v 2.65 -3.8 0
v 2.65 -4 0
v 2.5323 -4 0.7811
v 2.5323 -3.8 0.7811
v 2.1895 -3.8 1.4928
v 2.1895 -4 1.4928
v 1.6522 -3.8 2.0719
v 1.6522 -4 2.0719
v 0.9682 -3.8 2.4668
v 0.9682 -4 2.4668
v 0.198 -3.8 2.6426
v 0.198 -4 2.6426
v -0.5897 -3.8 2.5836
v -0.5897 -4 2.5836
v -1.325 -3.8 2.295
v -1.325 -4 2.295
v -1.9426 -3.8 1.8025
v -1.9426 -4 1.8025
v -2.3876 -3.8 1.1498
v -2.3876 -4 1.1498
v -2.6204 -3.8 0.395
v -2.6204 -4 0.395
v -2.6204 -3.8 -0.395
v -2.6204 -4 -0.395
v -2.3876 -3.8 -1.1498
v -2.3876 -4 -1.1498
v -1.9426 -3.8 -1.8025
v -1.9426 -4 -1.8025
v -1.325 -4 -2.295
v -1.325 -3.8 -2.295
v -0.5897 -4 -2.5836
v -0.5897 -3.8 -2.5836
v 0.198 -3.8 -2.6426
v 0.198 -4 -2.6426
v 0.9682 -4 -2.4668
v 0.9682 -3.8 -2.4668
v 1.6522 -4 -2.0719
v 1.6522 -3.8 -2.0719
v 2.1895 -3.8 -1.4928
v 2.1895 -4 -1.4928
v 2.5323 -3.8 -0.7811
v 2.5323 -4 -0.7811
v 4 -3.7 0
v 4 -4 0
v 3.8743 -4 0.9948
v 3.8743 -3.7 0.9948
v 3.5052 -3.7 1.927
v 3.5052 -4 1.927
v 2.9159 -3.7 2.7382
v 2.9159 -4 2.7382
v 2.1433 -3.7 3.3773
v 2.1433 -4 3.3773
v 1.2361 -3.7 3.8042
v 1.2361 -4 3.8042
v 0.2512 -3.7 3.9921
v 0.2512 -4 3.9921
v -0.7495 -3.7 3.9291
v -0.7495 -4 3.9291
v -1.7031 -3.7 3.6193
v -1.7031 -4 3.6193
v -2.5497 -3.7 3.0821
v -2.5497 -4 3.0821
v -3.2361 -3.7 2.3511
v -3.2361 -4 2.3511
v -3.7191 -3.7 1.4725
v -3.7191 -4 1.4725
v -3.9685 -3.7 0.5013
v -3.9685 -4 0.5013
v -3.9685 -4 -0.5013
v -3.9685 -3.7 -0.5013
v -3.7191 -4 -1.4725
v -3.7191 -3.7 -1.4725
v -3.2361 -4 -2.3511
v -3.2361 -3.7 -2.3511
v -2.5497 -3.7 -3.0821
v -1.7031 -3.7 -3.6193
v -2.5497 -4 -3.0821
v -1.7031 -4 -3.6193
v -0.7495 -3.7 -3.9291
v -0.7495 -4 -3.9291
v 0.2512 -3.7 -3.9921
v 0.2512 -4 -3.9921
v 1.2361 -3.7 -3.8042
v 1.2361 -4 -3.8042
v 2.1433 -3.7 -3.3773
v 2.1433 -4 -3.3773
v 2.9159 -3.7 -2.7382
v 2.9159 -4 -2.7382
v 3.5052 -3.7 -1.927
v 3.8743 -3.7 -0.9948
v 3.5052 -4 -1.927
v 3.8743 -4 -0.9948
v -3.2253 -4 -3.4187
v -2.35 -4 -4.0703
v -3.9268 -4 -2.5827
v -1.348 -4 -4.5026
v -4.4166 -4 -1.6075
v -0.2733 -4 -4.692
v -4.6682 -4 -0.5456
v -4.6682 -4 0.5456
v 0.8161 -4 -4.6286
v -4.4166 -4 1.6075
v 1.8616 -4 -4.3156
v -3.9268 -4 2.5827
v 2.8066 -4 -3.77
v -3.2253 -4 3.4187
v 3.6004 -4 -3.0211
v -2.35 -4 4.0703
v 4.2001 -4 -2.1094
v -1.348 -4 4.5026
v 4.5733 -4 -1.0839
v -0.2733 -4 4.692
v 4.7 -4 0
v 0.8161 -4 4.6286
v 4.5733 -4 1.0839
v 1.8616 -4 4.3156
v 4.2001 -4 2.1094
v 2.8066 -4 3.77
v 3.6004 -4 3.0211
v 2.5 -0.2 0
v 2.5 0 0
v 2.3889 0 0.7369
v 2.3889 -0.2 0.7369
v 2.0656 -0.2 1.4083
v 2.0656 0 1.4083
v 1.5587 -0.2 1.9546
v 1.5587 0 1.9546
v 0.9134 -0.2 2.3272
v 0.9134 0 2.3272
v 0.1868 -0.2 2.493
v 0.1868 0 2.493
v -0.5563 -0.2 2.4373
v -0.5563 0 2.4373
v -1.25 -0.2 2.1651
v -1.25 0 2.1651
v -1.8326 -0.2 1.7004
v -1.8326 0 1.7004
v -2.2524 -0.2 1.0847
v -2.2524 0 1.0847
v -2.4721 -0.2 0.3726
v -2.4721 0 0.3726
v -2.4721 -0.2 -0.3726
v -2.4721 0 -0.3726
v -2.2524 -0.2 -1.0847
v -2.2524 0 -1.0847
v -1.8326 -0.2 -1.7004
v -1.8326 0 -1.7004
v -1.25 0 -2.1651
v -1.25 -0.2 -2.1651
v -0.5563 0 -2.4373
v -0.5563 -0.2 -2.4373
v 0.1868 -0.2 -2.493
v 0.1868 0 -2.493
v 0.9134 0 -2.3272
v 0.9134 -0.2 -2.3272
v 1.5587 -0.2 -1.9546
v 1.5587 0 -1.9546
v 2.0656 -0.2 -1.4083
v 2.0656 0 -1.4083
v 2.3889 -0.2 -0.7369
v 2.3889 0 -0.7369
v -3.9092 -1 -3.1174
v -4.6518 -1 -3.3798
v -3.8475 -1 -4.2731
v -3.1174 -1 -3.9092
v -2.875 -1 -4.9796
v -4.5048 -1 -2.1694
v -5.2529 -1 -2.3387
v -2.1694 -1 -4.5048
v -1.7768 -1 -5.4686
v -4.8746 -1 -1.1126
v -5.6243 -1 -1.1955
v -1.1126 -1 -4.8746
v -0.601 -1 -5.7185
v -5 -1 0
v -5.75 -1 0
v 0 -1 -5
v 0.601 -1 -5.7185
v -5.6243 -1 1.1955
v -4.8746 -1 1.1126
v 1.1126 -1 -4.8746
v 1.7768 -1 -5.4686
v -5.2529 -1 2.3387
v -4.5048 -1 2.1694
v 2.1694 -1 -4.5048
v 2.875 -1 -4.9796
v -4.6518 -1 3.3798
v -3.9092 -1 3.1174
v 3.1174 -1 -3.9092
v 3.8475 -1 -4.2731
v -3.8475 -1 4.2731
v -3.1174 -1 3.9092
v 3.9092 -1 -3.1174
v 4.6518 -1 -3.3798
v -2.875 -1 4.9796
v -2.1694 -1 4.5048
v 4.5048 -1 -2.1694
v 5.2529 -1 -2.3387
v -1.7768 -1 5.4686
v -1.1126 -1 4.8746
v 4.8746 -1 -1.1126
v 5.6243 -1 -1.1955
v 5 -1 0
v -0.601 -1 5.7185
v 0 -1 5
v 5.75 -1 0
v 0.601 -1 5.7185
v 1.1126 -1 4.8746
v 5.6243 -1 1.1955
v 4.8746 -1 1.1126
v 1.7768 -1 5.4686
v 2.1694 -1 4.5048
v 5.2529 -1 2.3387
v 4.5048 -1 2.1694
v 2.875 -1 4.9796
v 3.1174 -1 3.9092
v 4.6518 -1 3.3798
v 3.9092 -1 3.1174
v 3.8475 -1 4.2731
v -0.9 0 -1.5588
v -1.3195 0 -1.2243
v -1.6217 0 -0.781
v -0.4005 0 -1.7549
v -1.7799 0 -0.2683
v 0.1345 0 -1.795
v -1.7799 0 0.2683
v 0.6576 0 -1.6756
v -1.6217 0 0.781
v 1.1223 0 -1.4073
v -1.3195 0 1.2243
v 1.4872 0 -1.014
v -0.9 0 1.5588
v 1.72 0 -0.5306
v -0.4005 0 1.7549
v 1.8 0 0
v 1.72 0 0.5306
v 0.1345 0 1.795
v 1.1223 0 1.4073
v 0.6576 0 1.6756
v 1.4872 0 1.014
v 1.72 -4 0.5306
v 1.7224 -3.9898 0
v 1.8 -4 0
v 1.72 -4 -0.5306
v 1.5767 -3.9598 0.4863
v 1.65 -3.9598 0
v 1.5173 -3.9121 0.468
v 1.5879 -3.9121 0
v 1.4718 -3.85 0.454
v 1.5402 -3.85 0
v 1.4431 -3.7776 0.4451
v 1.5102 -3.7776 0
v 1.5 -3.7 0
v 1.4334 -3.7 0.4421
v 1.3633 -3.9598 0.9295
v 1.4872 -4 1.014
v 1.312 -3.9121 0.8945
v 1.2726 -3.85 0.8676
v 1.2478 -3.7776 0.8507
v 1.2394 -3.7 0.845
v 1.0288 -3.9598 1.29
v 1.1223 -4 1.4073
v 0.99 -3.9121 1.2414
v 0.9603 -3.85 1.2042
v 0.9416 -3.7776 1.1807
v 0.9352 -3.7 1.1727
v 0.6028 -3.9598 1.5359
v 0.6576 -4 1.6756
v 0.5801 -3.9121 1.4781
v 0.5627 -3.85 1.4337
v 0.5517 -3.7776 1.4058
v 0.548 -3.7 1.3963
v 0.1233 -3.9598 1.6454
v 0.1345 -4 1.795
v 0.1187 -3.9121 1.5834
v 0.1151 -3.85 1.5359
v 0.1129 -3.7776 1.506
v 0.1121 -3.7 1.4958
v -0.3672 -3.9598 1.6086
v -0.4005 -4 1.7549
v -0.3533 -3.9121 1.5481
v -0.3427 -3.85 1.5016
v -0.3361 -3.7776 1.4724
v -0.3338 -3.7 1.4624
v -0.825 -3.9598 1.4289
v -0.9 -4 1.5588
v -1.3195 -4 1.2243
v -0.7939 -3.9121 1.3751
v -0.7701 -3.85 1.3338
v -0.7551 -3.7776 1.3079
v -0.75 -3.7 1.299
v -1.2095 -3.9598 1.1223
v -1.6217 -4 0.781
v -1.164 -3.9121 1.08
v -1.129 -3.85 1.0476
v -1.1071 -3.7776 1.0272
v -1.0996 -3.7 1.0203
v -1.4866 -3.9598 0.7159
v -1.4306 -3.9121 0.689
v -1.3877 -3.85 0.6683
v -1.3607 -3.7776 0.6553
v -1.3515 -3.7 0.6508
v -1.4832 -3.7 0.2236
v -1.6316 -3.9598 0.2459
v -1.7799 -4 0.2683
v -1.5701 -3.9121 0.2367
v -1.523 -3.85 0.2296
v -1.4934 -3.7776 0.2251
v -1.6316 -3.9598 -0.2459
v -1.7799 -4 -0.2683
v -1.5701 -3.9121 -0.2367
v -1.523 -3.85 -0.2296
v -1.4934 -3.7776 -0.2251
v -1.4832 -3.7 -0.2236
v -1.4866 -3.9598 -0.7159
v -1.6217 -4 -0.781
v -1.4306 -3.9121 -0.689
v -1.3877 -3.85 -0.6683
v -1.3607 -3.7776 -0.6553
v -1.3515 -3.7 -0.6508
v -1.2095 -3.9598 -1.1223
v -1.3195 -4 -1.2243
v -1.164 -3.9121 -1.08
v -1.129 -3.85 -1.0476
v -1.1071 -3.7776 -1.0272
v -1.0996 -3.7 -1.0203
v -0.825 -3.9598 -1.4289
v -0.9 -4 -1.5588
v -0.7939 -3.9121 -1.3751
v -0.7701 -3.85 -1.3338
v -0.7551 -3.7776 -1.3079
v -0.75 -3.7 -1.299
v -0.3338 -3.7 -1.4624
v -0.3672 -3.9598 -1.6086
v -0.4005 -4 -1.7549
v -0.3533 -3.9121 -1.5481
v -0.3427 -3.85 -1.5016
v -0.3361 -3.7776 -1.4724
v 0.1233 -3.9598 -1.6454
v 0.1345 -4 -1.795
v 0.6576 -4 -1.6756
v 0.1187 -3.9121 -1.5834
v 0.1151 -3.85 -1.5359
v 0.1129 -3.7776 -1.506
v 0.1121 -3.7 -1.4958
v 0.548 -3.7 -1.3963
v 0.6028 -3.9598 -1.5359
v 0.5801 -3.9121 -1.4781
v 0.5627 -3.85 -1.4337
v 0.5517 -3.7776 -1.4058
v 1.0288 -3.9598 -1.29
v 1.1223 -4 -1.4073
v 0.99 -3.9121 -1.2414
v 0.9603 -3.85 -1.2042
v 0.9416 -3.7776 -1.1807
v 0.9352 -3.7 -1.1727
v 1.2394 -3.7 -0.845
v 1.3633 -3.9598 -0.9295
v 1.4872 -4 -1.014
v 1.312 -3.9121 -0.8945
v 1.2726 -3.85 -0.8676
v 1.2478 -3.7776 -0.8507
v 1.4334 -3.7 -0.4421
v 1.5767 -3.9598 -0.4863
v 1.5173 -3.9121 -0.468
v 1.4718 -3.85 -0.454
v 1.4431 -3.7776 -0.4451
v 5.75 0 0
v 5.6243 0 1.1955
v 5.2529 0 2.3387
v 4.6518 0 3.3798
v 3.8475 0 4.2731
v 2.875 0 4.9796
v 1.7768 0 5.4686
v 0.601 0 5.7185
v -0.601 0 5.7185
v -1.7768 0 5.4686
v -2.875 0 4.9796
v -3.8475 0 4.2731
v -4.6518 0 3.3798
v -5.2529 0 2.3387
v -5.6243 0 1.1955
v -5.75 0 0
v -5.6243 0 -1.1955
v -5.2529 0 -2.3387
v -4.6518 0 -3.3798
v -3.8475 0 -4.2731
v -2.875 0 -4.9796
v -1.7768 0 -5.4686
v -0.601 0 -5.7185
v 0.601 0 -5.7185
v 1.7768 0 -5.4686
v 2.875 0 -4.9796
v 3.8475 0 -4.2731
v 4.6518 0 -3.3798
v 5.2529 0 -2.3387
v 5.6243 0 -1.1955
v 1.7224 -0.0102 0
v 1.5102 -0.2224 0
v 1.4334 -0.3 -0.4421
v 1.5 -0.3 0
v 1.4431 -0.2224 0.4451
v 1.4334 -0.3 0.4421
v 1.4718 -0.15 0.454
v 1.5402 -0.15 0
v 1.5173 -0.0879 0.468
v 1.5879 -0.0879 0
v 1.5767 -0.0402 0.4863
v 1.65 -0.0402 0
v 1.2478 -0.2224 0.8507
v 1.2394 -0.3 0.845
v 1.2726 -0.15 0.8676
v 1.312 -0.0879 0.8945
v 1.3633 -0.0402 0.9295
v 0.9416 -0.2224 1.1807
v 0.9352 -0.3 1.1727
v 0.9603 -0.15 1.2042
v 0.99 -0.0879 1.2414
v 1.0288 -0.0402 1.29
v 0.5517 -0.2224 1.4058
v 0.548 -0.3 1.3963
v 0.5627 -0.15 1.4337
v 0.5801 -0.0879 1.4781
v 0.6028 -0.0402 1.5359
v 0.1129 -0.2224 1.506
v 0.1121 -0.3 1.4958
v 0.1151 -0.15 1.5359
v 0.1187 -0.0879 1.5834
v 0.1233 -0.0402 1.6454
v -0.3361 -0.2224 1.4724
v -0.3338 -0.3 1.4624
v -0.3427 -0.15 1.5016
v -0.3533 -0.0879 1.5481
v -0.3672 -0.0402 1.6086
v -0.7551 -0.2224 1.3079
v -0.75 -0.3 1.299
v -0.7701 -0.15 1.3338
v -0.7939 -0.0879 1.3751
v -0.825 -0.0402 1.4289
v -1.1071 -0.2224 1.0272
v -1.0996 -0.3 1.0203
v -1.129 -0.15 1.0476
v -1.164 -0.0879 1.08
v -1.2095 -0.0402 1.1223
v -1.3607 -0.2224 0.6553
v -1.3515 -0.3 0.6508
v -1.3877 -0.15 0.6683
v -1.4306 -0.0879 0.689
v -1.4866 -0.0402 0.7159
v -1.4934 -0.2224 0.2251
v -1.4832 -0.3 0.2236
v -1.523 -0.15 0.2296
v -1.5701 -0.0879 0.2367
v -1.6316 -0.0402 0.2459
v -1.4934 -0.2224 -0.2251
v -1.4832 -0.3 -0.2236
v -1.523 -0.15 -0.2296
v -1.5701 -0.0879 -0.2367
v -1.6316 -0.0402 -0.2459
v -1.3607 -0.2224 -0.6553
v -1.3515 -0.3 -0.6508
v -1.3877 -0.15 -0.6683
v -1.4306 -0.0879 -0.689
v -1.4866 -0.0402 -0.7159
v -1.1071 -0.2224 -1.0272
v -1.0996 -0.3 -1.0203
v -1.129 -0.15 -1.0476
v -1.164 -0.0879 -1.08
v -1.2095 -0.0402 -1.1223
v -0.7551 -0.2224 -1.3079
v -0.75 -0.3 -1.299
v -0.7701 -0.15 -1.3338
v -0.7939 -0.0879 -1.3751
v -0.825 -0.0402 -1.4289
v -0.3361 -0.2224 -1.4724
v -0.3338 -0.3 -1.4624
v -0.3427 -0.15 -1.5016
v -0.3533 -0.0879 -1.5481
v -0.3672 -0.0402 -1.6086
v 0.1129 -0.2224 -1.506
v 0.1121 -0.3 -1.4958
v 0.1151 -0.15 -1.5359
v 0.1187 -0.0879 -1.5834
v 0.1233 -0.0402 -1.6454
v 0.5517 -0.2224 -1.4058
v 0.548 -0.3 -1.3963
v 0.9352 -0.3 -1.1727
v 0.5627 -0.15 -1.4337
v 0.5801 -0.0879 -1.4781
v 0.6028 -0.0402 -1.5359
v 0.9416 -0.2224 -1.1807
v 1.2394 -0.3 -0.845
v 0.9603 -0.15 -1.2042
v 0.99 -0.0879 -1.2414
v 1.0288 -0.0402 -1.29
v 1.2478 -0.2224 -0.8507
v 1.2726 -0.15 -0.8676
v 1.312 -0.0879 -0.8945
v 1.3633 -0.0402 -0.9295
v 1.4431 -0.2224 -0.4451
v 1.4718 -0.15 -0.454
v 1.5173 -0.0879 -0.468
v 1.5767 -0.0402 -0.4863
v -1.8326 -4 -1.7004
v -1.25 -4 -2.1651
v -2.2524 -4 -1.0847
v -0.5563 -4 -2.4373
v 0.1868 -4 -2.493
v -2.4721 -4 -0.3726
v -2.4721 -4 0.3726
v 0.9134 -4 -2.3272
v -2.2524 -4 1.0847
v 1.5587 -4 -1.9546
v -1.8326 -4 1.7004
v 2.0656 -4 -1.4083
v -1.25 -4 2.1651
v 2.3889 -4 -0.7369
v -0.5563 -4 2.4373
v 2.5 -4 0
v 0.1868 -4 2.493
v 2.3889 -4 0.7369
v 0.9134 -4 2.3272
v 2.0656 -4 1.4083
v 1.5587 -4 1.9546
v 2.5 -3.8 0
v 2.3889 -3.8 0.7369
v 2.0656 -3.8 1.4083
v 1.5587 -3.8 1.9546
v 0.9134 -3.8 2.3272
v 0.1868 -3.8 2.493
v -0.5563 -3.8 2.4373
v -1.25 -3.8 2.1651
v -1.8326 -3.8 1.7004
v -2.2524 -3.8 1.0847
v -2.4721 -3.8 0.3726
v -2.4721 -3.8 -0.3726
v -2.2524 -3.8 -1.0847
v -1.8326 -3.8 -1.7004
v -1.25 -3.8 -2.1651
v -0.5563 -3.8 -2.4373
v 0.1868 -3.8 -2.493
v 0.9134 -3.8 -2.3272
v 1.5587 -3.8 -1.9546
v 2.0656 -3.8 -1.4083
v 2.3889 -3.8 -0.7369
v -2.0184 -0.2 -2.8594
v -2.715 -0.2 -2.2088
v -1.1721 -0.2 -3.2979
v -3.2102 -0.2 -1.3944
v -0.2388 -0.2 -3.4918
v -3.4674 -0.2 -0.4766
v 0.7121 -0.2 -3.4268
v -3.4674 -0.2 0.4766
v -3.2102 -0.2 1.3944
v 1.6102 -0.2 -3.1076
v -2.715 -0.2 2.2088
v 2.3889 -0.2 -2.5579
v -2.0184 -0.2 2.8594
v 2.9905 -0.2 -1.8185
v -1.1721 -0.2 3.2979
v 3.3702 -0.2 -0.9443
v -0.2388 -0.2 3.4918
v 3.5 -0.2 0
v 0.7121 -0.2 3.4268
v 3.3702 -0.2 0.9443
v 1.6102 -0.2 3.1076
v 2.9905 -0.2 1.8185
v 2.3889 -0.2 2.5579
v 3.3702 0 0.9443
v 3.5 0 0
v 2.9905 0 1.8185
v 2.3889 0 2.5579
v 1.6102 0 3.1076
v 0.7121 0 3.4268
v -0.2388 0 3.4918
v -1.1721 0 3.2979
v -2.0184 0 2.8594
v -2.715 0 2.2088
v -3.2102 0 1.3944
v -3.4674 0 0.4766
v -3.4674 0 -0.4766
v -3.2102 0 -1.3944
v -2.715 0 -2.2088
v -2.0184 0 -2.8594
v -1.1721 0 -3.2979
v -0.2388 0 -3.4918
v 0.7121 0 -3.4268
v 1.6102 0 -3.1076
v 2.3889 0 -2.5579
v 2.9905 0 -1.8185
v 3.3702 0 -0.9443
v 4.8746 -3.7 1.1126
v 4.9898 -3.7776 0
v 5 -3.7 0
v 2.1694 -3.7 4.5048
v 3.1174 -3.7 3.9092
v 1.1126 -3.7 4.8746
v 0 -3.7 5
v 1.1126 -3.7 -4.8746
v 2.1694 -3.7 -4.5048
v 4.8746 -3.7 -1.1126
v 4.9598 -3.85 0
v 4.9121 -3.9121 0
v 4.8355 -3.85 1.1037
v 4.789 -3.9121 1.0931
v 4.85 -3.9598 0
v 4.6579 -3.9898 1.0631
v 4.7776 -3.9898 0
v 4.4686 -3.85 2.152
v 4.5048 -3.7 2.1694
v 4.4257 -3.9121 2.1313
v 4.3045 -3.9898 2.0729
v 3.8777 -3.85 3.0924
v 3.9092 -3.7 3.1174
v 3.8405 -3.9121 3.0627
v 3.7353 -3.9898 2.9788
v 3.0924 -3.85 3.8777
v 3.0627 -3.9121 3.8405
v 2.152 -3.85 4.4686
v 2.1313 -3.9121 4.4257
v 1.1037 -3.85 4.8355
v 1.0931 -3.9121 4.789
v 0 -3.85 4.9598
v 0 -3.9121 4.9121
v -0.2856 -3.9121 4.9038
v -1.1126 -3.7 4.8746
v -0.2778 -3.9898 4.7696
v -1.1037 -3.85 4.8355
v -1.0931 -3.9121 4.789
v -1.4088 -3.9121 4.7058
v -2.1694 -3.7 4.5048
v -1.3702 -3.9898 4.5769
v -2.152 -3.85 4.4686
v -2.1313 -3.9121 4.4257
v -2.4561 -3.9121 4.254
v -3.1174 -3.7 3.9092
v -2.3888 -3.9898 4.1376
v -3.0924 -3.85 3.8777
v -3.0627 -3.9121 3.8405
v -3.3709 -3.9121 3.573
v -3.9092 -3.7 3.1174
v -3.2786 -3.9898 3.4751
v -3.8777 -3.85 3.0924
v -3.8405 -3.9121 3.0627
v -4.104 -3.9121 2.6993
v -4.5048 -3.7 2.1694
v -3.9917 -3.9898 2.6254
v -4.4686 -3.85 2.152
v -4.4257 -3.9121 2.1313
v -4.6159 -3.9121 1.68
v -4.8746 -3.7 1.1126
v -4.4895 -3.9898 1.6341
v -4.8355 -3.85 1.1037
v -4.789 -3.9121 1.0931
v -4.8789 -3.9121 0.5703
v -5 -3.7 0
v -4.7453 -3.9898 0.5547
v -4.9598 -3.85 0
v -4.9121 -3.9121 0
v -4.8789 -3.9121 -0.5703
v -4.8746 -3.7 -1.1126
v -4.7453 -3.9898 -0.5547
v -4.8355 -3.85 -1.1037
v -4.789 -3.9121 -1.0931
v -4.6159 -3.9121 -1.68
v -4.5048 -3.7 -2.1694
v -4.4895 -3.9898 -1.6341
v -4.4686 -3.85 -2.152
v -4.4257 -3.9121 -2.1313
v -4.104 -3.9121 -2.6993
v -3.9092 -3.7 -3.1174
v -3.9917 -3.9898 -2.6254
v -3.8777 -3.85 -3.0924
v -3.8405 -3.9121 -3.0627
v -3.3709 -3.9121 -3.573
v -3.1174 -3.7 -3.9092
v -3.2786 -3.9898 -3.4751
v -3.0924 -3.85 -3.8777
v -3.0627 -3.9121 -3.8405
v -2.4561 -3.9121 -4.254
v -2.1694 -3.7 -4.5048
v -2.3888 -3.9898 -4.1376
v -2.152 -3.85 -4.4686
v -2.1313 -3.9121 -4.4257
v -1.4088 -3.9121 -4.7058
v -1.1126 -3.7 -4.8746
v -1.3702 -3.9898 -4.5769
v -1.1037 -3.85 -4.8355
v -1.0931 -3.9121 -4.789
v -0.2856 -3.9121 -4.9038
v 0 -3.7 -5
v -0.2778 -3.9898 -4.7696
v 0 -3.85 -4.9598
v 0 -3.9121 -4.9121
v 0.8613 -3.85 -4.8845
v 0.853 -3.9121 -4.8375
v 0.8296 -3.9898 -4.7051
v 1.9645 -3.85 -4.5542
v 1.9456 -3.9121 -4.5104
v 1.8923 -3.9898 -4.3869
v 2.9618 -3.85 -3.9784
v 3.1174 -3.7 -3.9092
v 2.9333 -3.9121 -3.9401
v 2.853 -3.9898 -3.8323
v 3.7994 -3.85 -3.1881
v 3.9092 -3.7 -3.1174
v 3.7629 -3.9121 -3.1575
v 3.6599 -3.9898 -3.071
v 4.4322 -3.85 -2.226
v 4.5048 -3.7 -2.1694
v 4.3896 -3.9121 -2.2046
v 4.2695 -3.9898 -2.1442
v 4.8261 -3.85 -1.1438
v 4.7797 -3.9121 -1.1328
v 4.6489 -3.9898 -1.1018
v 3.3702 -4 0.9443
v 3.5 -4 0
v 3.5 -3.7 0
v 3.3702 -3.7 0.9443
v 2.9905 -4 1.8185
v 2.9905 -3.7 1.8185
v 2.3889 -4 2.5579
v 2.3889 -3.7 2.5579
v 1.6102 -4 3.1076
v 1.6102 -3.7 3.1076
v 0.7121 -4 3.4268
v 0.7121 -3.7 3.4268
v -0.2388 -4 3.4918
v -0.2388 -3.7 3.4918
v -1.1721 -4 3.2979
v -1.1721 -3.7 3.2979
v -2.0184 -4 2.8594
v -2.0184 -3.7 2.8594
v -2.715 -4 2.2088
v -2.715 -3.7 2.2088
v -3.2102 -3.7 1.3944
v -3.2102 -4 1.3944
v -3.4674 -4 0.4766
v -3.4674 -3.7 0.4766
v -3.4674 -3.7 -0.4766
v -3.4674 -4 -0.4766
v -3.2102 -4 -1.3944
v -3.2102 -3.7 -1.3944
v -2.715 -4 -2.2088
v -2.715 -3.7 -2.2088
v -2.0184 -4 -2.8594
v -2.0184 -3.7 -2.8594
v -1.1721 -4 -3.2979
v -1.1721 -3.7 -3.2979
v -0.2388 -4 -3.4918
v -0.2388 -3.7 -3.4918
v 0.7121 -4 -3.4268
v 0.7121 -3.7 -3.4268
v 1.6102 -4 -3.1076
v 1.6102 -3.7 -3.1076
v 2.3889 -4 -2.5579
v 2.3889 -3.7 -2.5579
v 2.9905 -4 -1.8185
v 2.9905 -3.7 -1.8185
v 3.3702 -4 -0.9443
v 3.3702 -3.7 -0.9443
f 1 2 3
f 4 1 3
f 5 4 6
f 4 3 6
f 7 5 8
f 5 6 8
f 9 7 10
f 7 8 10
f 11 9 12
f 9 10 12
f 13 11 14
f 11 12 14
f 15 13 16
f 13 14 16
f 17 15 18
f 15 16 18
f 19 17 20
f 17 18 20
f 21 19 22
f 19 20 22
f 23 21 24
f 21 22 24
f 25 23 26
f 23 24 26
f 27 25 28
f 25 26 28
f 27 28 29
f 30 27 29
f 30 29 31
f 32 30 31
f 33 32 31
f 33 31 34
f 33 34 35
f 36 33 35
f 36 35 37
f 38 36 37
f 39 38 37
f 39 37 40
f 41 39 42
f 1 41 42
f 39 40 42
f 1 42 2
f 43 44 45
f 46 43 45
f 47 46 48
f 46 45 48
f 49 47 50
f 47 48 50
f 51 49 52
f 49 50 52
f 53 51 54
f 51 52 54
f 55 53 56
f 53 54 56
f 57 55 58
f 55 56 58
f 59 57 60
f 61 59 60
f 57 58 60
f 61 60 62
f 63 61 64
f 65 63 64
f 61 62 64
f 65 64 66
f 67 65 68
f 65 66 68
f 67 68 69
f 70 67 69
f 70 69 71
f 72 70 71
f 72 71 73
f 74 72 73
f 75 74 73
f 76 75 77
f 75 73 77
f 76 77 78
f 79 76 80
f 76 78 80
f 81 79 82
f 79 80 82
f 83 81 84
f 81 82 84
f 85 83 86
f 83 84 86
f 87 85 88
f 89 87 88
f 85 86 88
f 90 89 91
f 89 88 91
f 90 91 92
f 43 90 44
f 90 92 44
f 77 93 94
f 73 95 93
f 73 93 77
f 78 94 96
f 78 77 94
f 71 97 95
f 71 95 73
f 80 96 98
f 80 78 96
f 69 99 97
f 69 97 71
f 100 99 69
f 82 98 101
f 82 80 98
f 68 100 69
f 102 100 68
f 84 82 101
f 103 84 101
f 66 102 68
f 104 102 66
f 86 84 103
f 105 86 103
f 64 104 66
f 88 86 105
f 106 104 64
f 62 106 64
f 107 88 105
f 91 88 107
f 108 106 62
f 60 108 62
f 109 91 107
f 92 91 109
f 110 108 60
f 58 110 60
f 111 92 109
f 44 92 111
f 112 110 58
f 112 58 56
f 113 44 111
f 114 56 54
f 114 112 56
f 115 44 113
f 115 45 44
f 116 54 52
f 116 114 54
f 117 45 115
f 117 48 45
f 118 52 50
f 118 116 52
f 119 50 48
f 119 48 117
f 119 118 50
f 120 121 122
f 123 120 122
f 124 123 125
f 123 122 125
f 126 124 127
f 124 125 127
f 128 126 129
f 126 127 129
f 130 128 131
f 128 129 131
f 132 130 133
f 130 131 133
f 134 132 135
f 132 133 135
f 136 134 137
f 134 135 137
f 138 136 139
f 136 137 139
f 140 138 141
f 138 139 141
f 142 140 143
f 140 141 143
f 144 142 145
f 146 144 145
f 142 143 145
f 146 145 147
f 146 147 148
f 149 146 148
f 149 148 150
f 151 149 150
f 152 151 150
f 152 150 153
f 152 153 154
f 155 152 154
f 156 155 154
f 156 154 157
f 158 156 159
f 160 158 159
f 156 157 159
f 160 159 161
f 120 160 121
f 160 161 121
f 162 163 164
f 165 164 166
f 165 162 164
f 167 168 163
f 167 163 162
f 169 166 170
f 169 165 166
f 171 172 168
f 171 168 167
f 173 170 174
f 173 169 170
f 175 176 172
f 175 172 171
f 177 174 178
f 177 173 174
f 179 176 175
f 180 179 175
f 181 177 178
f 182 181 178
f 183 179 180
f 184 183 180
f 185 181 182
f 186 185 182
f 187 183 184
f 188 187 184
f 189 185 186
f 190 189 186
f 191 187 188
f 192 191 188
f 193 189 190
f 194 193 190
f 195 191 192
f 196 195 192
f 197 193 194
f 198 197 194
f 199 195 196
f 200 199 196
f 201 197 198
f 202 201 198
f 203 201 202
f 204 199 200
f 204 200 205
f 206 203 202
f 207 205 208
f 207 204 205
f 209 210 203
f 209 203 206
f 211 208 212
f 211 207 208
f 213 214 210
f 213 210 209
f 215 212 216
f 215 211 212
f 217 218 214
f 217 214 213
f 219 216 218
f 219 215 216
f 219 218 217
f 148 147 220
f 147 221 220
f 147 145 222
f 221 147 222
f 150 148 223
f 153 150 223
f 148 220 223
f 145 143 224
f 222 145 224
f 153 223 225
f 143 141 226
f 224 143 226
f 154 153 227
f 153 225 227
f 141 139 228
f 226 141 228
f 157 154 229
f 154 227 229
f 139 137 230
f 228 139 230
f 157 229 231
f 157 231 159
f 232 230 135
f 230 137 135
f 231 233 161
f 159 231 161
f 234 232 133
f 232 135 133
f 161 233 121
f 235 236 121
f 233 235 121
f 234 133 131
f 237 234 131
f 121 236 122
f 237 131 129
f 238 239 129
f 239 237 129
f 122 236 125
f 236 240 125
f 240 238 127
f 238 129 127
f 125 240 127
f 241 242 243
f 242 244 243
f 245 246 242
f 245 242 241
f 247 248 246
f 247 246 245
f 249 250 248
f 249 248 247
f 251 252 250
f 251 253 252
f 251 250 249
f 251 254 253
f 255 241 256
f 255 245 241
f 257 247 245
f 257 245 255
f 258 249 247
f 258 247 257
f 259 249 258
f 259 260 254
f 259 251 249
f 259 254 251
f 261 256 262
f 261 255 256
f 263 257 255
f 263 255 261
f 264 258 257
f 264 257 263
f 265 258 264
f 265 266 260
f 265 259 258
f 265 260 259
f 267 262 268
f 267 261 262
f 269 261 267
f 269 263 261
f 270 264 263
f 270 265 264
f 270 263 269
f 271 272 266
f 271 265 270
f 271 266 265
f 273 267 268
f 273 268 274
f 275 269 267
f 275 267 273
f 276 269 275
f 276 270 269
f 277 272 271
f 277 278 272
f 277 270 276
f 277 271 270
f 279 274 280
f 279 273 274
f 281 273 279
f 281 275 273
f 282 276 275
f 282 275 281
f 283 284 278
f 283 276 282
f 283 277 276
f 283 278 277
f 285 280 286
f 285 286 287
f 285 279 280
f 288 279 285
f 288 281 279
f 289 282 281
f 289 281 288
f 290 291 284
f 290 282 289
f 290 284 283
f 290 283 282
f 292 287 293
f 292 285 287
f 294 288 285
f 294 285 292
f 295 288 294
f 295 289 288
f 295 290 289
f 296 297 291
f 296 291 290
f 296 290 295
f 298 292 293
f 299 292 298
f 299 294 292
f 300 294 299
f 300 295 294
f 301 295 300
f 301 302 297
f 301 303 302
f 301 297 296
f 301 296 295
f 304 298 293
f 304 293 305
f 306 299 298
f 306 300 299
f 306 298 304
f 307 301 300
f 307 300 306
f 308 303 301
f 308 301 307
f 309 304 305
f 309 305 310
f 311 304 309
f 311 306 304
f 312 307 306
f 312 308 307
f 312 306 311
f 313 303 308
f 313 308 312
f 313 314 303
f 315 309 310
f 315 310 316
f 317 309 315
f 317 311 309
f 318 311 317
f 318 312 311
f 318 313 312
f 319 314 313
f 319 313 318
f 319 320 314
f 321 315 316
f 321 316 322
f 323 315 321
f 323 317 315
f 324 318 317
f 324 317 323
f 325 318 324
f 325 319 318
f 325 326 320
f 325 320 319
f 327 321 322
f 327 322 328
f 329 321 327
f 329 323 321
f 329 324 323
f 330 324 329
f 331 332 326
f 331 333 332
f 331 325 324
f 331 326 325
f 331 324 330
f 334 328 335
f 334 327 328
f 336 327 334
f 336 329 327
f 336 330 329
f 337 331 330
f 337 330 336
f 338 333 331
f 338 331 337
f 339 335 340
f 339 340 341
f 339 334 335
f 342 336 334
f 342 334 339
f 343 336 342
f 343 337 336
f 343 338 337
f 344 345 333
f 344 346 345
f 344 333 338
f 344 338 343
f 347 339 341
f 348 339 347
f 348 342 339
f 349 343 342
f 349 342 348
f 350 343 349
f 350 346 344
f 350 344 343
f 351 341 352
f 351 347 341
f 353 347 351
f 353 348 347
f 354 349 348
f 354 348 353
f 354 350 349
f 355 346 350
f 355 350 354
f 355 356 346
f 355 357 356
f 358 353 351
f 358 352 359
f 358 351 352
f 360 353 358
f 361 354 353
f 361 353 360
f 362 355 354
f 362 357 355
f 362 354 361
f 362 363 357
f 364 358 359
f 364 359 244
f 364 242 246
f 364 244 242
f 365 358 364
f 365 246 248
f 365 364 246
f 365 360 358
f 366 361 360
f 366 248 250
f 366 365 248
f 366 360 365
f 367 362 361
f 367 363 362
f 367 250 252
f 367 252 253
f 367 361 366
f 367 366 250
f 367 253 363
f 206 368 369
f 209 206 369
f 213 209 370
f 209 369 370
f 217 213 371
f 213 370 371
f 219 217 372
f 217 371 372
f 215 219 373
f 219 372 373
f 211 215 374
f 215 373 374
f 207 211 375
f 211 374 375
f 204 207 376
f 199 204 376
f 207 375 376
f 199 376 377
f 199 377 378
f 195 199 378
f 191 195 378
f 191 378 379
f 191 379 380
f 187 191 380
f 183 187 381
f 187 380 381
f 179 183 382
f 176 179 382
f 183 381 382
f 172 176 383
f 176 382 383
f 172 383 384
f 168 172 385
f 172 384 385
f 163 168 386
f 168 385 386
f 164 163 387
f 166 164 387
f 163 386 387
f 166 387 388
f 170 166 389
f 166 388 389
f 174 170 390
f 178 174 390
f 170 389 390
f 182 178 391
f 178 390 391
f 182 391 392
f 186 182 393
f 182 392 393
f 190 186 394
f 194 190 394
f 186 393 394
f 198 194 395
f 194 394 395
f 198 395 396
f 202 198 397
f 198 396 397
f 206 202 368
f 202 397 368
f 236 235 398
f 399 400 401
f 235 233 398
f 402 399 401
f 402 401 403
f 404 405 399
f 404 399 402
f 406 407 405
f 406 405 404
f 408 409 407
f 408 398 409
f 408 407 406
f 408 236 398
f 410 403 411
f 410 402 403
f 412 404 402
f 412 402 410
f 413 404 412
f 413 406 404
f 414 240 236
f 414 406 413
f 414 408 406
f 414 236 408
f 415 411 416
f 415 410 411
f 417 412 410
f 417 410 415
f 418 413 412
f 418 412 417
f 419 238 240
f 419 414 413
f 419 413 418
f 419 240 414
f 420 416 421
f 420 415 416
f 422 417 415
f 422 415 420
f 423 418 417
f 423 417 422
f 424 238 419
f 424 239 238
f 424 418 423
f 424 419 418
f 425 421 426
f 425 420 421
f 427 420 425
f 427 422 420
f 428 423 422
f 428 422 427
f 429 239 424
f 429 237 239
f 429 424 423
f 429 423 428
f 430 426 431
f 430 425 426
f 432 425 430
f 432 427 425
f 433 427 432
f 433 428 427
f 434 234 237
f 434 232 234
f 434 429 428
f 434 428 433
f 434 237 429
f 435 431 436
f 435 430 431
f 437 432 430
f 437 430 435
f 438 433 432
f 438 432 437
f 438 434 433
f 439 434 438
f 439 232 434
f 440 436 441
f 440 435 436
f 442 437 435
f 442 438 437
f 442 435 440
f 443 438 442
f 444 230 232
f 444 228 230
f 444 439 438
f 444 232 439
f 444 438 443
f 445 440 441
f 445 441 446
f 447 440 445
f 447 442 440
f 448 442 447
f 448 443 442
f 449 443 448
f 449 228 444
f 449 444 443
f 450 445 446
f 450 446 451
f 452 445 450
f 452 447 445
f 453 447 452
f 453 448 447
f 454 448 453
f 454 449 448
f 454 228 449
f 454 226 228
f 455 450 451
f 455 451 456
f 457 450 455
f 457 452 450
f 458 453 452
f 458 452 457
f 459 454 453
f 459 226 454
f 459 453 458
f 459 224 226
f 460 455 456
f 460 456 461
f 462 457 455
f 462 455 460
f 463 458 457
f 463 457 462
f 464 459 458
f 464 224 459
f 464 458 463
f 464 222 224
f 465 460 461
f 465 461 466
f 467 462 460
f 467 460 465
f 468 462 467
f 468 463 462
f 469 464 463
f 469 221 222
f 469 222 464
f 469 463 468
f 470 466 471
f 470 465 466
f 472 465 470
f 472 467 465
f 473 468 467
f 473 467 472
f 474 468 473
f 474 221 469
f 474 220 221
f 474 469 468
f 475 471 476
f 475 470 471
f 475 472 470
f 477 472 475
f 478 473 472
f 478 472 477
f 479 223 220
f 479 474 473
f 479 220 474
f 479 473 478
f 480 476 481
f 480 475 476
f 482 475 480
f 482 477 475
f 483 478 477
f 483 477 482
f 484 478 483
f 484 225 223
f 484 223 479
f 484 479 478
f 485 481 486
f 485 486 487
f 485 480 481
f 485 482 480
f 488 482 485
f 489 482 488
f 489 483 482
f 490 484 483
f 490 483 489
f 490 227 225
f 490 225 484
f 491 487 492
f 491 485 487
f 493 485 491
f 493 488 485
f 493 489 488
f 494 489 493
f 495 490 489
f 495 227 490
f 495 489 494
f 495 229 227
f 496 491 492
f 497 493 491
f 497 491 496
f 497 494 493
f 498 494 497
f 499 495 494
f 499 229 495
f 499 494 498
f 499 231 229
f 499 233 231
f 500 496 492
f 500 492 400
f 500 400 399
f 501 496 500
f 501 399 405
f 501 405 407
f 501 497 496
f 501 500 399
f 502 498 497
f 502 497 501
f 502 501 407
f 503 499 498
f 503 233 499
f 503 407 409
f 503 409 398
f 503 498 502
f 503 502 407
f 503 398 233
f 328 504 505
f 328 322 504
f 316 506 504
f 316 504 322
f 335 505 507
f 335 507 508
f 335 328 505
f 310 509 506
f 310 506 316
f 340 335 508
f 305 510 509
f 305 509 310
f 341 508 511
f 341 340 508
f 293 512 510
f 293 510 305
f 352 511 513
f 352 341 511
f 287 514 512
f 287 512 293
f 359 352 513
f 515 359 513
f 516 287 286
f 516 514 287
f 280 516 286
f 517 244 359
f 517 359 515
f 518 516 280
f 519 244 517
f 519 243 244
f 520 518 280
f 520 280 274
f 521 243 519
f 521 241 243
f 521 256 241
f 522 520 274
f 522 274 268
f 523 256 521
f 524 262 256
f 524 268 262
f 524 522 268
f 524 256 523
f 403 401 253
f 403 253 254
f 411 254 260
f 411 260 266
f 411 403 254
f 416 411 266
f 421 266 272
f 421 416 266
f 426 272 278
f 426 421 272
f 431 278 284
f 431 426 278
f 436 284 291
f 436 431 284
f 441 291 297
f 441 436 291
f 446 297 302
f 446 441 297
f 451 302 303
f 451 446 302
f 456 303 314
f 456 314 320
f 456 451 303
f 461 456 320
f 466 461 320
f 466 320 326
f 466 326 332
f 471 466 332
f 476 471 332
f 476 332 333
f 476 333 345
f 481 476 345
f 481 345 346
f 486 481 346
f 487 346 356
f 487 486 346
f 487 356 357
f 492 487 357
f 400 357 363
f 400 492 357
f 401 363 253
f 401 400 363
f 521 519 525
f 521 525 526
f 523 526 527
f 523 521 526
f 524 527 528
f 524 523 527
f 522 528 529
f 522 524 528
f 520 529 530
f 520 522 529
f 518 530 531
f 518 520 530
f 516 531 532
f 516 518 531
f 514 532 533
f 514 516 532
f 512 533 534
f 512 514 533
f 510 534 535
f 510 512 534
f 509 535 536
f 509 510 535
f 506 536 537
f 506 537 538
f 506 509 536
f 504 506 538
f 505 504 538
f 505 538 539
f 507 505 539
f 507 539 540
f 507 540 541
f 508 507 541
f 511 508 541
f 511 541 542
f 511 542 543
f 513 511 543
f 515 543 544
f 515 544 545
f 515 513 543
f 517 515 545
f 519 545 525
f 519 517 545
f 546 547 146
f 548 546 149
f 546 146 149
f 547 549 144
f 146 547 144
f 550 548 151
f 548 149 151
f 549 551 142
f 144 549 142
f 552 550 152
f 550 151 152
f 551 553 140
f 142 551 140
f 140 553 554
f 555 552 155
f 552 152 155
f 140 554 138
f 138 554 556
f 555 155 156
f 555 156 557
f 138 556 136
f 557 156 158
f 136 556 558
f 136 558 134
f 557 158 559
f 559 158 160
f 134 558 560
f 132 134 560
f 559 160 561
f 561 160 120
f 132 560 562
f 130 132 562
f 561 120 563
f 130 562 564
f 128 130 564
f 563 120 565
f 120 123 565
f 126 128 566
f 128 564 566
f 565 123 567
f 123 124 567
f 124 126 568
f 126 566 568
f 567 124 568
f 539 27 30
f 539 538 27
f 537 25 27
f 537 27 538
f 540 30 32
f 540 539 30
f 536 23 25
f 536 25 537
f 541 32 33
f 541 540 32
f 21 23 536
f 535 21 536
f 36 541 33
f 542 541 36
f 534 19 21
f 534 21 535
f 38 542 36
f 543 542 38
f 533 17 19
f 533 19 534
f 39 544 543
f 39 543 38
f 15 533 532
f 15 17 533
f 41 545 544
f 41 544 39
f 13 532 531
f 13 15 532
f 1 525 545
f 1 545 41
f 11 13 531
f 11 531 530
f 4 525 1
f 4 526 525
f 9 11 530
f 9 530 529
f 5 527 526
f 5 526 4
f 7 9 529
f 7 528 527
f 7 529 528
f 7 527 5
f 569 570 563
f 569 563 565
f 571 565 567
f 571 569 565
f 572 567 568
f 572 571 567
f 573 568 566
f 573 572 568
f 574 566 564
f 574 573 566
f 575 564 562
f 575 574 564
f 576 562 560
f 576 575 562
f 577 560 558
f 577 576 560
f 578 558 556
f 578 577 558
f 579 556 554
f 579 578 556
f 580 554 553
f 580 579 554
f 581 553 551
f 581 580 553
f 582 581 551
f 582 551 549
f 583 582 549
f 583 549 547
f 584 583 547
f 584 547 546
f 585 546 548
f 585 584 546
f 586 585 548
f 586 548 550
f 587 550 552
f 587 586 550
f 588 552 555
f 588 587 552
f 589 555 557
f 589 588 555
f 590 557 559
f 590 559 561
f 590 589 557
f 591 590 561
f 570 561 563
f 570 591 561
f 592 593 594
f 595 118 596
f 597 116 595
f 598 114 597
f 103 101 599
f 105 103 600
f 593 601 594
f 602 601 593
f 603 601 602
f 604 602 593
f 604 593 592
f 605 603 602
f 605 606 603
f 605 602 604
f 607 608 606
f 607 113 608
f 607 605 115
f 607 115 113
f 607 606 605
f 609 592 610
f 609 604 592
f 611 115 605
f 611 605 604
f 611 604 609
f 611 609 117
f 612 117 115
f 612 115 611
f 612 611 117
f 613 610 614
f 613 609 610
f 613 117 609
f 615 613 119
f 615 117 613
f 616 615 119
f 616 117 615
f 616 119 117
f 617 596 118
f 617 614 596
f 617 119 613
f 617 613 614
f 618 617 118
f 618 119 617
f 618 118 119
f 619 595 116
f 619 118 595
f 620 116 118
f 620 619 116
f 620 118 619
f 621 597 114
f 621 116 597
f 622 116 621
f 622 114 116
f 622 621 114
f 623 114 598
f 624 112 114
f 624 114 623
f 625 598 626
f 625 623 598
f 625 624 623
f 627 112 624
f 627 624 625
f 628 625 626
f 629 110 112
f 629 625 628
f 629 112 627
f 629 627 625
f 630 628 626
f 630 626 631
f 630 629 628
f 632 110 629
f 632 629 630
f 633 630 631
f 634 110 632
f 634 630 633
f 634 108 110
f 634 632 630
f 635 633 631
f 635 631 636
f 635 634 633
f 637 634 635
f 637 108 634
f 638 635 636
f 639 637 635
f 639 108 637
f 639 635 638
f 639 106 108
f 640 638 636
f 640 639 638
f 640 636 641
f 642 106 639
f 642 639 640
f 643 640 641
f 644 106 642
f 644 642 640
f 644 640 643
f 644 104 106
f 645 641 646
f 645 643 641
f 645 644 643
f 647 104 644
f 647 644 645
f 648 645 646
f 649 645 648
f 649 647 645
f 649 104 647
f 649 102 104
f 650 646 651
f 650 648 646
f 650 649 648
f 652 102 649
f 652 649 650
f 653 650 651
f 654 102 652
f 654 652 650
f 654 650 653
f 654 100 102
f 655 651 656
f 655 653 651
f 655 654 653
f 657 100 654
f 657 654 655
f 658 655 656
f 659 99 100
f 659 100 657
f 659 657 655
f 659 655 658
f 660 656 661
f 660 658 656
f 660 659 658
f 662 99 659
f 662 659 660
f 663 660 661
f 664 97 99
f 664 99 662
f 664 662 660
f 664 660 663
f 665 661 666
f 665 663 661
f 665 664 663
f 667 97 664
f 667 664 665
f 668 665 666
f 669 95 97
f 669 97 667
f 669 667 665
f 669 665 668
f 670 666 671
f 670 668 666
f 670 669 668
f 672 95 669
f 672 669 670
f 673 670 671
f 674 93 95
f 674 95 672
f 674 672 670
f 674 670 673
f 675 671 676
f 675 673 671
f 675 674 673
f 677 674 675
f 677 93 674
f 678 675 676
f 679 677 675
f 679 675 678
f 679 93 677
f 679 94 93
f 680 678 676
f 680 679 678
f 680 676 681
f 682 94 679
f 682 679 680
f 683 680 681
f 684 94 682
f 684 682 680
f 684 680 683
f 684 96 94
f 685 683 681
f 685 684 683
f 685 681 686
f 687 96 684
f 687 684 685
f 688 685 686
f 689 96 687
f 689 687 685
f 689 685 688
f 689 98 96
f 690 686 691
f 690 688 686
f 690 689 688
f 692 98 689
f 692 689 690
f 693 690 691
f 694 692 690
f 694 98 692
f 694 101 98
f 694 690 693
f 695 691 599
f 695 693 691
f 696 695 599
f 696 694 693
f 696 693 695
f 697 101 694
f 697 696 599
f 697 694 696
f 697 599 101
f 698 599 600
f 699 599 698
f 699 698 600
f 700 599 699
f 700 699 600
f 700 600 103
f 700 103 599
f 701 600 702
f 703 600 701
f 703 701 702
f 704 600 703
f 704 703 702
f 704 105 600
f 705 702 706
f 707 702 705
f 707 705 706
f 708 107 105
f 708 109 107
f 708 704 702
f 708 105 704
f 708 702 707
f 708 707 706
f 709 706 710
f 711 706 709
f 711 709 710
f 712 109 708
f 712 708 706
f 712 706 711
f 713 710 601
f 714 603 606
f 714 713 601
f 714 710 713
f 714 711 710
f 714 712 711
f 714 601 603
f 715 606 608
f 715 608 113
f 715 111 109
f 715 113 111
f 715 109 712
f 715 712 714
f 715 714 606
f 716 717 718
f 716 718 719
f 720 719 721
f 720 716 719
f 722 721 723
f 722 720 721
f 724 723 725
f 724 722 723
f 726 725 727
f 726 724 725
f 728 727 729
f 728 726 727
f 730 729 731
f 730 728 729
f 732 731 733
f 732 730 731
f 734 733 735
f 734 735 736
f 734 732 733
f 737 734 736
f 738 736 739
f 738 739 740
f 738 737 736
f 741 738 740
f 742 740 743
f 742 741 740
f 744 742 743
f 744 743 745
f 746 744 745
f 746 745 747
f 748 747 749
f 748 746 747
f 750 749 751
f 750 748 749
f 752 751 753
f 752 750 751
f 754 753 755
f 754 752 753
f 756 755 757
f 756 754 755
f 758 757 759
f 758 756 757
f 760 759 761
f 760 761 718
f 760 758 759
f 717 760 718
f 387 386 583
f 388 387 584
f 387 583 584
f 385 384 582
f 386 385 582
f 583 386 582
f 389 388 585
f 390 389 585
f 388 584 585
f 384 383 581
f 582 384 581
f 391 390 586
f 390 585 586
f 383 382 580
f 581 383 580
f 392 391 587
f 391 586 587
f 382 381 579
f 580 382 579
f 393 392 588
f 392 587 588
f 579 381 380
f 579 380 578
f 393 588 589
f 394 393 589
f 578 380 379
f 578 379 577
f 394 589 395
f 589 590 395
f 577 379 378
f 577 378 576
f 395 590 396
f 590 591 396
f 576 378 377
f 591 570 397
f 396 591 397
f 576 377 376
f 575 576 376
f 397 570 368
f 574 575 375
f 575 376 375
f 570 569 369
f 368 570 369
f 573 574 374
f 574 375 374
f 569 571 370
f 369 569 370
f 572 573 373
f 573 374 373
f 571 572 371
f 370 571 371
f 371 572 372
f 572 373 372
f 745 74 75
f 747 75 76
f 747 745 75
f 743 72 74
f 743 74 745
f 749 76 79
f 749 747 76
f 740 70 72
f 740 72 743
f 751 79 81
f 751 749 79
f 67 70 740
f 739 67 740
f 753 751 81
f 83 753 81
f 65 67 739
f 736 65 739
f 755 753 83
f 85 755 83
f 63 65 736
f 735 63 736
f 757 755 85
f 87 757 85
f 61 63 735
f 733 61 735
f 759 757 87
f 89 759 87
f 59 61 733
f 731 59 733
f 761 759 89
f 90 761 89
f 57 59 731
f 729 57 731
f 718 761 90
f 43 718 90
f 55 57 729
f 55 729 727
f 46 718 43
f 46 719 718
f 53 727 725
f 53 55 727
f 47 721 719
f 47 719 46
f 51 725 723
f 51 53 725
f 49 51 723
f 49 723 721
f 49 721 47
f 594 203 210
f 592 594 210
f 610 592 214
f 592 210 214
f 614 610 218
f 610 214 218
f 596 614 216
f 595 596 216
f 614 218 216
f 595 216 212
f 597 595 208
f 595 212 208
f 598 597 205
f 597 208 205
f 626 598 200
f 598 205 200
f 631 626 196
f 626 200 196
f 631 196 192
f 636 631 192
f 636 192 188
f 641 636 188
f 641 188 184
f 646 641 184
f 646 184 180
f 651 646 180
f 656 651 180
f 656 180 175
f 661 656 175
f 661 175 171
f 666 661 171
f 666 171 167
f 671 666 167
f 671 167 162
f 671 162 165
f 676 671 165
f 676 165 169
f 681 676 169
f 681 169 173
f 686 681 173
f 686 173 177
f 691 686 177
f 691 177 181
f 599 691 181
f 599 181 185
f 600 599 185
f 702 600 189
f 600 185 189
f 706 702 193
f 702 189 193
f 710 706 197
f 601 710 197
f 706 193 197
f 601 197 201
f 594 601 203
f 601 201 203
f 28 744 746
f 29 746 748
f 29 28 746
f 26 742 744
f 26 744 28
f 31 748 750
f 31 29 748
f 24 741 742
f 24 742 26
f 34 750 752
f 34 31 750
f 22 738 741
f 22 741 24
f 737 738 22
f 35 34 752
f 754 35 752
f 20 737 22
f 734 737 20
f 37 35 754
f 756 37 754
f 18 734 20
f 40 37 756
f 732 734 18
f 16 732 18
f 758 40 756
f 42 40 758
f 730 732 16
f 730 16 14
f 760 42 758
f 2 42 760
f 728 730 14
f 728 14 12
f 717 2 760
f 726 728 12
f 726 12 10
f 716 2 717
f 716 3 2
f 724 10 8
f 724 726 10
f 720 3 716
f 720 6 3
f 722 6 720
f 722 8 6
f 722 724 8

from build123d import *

# Parameters (mm, degrees)
F0_R     = 5.75
F0_R_2   = 5
F1_DEPTH = 1
F0_R_3   = 3.5
F0_R_4   = 2.5
F0_R_5   = 1.5
F2_DEPTH = 4
F3_R     = 0.3
F4_R     = 2.65
F4_R_2   = 2.5
F5_DEPTH = 0.2
F4_R_3   = 4
F4_R_4   = 3.5
F6_DEPTH = 0.3
F7_DEPTH = 0.2


with BuildPart() as f1:
    # F0 (on Front) → F1 (new body)
    with BuildSketch(Plane.XZ):
        Circle(F0_R)
        Circle(F0_R_2, mode=Mode.SUBTRACT)
    extrude(amount=F1_DEPTH)

    # F0 (on Front) → F2 (join)
    with BuildSketch(Plane.XZ):
        Circle(F0_R_2)
        Circle(F0_R_3, mode=Mode.SUBTRACT)
        Circle(F0_R_3)
        Circle(F0_R_4, mode=Mode.SUBTRACT)
        Circle(F0_R_4)
        Circle(F0_R_5, mode=Mode.SUBTRACT)
    extrude(amount=F2_DEPTH)

    # F3
    f3_edges = [f1.edges().sort_by_distance(p)[0] for p in [
        (-5, -4, 0),
        (-1.5, -4, 0),
        (-1.5, 0, 0),
    ]]
    fillet(f3_edges, radius=F3_R)

    # F4 (on face) → F5 (cut)
    with BuildSketch(Plane.XZ.offset(4)):
        Circle(F4_R)
        Circle(F4_R_2, mode=Mode.SUBTRACT)
    extrude(amount=-F5_DEPTH, mode=Mode.SUBTRACT)

    # F4 (on face) → F6 (cut)
    with BuildSketch(Plane.XZ.offset(4)):
        Circle(F4_R_3)
        Circle(F4_R_4, mode=Mode.SUBTRACT)
    extrude(amount=-F6_DEPTH, mode=Mode.SUBTRACT)

    # F0 (on Front) → F7 (cut)
    with BuildSketch(Plane.XZ):
        Circle(F0_R_3)
        Circle(F0_R_4, mode=Mode.SUBTRACT)
    extrude(amount=F7_DEPTH, mode=Mode.SUBTRACT)


solid = f1.part
